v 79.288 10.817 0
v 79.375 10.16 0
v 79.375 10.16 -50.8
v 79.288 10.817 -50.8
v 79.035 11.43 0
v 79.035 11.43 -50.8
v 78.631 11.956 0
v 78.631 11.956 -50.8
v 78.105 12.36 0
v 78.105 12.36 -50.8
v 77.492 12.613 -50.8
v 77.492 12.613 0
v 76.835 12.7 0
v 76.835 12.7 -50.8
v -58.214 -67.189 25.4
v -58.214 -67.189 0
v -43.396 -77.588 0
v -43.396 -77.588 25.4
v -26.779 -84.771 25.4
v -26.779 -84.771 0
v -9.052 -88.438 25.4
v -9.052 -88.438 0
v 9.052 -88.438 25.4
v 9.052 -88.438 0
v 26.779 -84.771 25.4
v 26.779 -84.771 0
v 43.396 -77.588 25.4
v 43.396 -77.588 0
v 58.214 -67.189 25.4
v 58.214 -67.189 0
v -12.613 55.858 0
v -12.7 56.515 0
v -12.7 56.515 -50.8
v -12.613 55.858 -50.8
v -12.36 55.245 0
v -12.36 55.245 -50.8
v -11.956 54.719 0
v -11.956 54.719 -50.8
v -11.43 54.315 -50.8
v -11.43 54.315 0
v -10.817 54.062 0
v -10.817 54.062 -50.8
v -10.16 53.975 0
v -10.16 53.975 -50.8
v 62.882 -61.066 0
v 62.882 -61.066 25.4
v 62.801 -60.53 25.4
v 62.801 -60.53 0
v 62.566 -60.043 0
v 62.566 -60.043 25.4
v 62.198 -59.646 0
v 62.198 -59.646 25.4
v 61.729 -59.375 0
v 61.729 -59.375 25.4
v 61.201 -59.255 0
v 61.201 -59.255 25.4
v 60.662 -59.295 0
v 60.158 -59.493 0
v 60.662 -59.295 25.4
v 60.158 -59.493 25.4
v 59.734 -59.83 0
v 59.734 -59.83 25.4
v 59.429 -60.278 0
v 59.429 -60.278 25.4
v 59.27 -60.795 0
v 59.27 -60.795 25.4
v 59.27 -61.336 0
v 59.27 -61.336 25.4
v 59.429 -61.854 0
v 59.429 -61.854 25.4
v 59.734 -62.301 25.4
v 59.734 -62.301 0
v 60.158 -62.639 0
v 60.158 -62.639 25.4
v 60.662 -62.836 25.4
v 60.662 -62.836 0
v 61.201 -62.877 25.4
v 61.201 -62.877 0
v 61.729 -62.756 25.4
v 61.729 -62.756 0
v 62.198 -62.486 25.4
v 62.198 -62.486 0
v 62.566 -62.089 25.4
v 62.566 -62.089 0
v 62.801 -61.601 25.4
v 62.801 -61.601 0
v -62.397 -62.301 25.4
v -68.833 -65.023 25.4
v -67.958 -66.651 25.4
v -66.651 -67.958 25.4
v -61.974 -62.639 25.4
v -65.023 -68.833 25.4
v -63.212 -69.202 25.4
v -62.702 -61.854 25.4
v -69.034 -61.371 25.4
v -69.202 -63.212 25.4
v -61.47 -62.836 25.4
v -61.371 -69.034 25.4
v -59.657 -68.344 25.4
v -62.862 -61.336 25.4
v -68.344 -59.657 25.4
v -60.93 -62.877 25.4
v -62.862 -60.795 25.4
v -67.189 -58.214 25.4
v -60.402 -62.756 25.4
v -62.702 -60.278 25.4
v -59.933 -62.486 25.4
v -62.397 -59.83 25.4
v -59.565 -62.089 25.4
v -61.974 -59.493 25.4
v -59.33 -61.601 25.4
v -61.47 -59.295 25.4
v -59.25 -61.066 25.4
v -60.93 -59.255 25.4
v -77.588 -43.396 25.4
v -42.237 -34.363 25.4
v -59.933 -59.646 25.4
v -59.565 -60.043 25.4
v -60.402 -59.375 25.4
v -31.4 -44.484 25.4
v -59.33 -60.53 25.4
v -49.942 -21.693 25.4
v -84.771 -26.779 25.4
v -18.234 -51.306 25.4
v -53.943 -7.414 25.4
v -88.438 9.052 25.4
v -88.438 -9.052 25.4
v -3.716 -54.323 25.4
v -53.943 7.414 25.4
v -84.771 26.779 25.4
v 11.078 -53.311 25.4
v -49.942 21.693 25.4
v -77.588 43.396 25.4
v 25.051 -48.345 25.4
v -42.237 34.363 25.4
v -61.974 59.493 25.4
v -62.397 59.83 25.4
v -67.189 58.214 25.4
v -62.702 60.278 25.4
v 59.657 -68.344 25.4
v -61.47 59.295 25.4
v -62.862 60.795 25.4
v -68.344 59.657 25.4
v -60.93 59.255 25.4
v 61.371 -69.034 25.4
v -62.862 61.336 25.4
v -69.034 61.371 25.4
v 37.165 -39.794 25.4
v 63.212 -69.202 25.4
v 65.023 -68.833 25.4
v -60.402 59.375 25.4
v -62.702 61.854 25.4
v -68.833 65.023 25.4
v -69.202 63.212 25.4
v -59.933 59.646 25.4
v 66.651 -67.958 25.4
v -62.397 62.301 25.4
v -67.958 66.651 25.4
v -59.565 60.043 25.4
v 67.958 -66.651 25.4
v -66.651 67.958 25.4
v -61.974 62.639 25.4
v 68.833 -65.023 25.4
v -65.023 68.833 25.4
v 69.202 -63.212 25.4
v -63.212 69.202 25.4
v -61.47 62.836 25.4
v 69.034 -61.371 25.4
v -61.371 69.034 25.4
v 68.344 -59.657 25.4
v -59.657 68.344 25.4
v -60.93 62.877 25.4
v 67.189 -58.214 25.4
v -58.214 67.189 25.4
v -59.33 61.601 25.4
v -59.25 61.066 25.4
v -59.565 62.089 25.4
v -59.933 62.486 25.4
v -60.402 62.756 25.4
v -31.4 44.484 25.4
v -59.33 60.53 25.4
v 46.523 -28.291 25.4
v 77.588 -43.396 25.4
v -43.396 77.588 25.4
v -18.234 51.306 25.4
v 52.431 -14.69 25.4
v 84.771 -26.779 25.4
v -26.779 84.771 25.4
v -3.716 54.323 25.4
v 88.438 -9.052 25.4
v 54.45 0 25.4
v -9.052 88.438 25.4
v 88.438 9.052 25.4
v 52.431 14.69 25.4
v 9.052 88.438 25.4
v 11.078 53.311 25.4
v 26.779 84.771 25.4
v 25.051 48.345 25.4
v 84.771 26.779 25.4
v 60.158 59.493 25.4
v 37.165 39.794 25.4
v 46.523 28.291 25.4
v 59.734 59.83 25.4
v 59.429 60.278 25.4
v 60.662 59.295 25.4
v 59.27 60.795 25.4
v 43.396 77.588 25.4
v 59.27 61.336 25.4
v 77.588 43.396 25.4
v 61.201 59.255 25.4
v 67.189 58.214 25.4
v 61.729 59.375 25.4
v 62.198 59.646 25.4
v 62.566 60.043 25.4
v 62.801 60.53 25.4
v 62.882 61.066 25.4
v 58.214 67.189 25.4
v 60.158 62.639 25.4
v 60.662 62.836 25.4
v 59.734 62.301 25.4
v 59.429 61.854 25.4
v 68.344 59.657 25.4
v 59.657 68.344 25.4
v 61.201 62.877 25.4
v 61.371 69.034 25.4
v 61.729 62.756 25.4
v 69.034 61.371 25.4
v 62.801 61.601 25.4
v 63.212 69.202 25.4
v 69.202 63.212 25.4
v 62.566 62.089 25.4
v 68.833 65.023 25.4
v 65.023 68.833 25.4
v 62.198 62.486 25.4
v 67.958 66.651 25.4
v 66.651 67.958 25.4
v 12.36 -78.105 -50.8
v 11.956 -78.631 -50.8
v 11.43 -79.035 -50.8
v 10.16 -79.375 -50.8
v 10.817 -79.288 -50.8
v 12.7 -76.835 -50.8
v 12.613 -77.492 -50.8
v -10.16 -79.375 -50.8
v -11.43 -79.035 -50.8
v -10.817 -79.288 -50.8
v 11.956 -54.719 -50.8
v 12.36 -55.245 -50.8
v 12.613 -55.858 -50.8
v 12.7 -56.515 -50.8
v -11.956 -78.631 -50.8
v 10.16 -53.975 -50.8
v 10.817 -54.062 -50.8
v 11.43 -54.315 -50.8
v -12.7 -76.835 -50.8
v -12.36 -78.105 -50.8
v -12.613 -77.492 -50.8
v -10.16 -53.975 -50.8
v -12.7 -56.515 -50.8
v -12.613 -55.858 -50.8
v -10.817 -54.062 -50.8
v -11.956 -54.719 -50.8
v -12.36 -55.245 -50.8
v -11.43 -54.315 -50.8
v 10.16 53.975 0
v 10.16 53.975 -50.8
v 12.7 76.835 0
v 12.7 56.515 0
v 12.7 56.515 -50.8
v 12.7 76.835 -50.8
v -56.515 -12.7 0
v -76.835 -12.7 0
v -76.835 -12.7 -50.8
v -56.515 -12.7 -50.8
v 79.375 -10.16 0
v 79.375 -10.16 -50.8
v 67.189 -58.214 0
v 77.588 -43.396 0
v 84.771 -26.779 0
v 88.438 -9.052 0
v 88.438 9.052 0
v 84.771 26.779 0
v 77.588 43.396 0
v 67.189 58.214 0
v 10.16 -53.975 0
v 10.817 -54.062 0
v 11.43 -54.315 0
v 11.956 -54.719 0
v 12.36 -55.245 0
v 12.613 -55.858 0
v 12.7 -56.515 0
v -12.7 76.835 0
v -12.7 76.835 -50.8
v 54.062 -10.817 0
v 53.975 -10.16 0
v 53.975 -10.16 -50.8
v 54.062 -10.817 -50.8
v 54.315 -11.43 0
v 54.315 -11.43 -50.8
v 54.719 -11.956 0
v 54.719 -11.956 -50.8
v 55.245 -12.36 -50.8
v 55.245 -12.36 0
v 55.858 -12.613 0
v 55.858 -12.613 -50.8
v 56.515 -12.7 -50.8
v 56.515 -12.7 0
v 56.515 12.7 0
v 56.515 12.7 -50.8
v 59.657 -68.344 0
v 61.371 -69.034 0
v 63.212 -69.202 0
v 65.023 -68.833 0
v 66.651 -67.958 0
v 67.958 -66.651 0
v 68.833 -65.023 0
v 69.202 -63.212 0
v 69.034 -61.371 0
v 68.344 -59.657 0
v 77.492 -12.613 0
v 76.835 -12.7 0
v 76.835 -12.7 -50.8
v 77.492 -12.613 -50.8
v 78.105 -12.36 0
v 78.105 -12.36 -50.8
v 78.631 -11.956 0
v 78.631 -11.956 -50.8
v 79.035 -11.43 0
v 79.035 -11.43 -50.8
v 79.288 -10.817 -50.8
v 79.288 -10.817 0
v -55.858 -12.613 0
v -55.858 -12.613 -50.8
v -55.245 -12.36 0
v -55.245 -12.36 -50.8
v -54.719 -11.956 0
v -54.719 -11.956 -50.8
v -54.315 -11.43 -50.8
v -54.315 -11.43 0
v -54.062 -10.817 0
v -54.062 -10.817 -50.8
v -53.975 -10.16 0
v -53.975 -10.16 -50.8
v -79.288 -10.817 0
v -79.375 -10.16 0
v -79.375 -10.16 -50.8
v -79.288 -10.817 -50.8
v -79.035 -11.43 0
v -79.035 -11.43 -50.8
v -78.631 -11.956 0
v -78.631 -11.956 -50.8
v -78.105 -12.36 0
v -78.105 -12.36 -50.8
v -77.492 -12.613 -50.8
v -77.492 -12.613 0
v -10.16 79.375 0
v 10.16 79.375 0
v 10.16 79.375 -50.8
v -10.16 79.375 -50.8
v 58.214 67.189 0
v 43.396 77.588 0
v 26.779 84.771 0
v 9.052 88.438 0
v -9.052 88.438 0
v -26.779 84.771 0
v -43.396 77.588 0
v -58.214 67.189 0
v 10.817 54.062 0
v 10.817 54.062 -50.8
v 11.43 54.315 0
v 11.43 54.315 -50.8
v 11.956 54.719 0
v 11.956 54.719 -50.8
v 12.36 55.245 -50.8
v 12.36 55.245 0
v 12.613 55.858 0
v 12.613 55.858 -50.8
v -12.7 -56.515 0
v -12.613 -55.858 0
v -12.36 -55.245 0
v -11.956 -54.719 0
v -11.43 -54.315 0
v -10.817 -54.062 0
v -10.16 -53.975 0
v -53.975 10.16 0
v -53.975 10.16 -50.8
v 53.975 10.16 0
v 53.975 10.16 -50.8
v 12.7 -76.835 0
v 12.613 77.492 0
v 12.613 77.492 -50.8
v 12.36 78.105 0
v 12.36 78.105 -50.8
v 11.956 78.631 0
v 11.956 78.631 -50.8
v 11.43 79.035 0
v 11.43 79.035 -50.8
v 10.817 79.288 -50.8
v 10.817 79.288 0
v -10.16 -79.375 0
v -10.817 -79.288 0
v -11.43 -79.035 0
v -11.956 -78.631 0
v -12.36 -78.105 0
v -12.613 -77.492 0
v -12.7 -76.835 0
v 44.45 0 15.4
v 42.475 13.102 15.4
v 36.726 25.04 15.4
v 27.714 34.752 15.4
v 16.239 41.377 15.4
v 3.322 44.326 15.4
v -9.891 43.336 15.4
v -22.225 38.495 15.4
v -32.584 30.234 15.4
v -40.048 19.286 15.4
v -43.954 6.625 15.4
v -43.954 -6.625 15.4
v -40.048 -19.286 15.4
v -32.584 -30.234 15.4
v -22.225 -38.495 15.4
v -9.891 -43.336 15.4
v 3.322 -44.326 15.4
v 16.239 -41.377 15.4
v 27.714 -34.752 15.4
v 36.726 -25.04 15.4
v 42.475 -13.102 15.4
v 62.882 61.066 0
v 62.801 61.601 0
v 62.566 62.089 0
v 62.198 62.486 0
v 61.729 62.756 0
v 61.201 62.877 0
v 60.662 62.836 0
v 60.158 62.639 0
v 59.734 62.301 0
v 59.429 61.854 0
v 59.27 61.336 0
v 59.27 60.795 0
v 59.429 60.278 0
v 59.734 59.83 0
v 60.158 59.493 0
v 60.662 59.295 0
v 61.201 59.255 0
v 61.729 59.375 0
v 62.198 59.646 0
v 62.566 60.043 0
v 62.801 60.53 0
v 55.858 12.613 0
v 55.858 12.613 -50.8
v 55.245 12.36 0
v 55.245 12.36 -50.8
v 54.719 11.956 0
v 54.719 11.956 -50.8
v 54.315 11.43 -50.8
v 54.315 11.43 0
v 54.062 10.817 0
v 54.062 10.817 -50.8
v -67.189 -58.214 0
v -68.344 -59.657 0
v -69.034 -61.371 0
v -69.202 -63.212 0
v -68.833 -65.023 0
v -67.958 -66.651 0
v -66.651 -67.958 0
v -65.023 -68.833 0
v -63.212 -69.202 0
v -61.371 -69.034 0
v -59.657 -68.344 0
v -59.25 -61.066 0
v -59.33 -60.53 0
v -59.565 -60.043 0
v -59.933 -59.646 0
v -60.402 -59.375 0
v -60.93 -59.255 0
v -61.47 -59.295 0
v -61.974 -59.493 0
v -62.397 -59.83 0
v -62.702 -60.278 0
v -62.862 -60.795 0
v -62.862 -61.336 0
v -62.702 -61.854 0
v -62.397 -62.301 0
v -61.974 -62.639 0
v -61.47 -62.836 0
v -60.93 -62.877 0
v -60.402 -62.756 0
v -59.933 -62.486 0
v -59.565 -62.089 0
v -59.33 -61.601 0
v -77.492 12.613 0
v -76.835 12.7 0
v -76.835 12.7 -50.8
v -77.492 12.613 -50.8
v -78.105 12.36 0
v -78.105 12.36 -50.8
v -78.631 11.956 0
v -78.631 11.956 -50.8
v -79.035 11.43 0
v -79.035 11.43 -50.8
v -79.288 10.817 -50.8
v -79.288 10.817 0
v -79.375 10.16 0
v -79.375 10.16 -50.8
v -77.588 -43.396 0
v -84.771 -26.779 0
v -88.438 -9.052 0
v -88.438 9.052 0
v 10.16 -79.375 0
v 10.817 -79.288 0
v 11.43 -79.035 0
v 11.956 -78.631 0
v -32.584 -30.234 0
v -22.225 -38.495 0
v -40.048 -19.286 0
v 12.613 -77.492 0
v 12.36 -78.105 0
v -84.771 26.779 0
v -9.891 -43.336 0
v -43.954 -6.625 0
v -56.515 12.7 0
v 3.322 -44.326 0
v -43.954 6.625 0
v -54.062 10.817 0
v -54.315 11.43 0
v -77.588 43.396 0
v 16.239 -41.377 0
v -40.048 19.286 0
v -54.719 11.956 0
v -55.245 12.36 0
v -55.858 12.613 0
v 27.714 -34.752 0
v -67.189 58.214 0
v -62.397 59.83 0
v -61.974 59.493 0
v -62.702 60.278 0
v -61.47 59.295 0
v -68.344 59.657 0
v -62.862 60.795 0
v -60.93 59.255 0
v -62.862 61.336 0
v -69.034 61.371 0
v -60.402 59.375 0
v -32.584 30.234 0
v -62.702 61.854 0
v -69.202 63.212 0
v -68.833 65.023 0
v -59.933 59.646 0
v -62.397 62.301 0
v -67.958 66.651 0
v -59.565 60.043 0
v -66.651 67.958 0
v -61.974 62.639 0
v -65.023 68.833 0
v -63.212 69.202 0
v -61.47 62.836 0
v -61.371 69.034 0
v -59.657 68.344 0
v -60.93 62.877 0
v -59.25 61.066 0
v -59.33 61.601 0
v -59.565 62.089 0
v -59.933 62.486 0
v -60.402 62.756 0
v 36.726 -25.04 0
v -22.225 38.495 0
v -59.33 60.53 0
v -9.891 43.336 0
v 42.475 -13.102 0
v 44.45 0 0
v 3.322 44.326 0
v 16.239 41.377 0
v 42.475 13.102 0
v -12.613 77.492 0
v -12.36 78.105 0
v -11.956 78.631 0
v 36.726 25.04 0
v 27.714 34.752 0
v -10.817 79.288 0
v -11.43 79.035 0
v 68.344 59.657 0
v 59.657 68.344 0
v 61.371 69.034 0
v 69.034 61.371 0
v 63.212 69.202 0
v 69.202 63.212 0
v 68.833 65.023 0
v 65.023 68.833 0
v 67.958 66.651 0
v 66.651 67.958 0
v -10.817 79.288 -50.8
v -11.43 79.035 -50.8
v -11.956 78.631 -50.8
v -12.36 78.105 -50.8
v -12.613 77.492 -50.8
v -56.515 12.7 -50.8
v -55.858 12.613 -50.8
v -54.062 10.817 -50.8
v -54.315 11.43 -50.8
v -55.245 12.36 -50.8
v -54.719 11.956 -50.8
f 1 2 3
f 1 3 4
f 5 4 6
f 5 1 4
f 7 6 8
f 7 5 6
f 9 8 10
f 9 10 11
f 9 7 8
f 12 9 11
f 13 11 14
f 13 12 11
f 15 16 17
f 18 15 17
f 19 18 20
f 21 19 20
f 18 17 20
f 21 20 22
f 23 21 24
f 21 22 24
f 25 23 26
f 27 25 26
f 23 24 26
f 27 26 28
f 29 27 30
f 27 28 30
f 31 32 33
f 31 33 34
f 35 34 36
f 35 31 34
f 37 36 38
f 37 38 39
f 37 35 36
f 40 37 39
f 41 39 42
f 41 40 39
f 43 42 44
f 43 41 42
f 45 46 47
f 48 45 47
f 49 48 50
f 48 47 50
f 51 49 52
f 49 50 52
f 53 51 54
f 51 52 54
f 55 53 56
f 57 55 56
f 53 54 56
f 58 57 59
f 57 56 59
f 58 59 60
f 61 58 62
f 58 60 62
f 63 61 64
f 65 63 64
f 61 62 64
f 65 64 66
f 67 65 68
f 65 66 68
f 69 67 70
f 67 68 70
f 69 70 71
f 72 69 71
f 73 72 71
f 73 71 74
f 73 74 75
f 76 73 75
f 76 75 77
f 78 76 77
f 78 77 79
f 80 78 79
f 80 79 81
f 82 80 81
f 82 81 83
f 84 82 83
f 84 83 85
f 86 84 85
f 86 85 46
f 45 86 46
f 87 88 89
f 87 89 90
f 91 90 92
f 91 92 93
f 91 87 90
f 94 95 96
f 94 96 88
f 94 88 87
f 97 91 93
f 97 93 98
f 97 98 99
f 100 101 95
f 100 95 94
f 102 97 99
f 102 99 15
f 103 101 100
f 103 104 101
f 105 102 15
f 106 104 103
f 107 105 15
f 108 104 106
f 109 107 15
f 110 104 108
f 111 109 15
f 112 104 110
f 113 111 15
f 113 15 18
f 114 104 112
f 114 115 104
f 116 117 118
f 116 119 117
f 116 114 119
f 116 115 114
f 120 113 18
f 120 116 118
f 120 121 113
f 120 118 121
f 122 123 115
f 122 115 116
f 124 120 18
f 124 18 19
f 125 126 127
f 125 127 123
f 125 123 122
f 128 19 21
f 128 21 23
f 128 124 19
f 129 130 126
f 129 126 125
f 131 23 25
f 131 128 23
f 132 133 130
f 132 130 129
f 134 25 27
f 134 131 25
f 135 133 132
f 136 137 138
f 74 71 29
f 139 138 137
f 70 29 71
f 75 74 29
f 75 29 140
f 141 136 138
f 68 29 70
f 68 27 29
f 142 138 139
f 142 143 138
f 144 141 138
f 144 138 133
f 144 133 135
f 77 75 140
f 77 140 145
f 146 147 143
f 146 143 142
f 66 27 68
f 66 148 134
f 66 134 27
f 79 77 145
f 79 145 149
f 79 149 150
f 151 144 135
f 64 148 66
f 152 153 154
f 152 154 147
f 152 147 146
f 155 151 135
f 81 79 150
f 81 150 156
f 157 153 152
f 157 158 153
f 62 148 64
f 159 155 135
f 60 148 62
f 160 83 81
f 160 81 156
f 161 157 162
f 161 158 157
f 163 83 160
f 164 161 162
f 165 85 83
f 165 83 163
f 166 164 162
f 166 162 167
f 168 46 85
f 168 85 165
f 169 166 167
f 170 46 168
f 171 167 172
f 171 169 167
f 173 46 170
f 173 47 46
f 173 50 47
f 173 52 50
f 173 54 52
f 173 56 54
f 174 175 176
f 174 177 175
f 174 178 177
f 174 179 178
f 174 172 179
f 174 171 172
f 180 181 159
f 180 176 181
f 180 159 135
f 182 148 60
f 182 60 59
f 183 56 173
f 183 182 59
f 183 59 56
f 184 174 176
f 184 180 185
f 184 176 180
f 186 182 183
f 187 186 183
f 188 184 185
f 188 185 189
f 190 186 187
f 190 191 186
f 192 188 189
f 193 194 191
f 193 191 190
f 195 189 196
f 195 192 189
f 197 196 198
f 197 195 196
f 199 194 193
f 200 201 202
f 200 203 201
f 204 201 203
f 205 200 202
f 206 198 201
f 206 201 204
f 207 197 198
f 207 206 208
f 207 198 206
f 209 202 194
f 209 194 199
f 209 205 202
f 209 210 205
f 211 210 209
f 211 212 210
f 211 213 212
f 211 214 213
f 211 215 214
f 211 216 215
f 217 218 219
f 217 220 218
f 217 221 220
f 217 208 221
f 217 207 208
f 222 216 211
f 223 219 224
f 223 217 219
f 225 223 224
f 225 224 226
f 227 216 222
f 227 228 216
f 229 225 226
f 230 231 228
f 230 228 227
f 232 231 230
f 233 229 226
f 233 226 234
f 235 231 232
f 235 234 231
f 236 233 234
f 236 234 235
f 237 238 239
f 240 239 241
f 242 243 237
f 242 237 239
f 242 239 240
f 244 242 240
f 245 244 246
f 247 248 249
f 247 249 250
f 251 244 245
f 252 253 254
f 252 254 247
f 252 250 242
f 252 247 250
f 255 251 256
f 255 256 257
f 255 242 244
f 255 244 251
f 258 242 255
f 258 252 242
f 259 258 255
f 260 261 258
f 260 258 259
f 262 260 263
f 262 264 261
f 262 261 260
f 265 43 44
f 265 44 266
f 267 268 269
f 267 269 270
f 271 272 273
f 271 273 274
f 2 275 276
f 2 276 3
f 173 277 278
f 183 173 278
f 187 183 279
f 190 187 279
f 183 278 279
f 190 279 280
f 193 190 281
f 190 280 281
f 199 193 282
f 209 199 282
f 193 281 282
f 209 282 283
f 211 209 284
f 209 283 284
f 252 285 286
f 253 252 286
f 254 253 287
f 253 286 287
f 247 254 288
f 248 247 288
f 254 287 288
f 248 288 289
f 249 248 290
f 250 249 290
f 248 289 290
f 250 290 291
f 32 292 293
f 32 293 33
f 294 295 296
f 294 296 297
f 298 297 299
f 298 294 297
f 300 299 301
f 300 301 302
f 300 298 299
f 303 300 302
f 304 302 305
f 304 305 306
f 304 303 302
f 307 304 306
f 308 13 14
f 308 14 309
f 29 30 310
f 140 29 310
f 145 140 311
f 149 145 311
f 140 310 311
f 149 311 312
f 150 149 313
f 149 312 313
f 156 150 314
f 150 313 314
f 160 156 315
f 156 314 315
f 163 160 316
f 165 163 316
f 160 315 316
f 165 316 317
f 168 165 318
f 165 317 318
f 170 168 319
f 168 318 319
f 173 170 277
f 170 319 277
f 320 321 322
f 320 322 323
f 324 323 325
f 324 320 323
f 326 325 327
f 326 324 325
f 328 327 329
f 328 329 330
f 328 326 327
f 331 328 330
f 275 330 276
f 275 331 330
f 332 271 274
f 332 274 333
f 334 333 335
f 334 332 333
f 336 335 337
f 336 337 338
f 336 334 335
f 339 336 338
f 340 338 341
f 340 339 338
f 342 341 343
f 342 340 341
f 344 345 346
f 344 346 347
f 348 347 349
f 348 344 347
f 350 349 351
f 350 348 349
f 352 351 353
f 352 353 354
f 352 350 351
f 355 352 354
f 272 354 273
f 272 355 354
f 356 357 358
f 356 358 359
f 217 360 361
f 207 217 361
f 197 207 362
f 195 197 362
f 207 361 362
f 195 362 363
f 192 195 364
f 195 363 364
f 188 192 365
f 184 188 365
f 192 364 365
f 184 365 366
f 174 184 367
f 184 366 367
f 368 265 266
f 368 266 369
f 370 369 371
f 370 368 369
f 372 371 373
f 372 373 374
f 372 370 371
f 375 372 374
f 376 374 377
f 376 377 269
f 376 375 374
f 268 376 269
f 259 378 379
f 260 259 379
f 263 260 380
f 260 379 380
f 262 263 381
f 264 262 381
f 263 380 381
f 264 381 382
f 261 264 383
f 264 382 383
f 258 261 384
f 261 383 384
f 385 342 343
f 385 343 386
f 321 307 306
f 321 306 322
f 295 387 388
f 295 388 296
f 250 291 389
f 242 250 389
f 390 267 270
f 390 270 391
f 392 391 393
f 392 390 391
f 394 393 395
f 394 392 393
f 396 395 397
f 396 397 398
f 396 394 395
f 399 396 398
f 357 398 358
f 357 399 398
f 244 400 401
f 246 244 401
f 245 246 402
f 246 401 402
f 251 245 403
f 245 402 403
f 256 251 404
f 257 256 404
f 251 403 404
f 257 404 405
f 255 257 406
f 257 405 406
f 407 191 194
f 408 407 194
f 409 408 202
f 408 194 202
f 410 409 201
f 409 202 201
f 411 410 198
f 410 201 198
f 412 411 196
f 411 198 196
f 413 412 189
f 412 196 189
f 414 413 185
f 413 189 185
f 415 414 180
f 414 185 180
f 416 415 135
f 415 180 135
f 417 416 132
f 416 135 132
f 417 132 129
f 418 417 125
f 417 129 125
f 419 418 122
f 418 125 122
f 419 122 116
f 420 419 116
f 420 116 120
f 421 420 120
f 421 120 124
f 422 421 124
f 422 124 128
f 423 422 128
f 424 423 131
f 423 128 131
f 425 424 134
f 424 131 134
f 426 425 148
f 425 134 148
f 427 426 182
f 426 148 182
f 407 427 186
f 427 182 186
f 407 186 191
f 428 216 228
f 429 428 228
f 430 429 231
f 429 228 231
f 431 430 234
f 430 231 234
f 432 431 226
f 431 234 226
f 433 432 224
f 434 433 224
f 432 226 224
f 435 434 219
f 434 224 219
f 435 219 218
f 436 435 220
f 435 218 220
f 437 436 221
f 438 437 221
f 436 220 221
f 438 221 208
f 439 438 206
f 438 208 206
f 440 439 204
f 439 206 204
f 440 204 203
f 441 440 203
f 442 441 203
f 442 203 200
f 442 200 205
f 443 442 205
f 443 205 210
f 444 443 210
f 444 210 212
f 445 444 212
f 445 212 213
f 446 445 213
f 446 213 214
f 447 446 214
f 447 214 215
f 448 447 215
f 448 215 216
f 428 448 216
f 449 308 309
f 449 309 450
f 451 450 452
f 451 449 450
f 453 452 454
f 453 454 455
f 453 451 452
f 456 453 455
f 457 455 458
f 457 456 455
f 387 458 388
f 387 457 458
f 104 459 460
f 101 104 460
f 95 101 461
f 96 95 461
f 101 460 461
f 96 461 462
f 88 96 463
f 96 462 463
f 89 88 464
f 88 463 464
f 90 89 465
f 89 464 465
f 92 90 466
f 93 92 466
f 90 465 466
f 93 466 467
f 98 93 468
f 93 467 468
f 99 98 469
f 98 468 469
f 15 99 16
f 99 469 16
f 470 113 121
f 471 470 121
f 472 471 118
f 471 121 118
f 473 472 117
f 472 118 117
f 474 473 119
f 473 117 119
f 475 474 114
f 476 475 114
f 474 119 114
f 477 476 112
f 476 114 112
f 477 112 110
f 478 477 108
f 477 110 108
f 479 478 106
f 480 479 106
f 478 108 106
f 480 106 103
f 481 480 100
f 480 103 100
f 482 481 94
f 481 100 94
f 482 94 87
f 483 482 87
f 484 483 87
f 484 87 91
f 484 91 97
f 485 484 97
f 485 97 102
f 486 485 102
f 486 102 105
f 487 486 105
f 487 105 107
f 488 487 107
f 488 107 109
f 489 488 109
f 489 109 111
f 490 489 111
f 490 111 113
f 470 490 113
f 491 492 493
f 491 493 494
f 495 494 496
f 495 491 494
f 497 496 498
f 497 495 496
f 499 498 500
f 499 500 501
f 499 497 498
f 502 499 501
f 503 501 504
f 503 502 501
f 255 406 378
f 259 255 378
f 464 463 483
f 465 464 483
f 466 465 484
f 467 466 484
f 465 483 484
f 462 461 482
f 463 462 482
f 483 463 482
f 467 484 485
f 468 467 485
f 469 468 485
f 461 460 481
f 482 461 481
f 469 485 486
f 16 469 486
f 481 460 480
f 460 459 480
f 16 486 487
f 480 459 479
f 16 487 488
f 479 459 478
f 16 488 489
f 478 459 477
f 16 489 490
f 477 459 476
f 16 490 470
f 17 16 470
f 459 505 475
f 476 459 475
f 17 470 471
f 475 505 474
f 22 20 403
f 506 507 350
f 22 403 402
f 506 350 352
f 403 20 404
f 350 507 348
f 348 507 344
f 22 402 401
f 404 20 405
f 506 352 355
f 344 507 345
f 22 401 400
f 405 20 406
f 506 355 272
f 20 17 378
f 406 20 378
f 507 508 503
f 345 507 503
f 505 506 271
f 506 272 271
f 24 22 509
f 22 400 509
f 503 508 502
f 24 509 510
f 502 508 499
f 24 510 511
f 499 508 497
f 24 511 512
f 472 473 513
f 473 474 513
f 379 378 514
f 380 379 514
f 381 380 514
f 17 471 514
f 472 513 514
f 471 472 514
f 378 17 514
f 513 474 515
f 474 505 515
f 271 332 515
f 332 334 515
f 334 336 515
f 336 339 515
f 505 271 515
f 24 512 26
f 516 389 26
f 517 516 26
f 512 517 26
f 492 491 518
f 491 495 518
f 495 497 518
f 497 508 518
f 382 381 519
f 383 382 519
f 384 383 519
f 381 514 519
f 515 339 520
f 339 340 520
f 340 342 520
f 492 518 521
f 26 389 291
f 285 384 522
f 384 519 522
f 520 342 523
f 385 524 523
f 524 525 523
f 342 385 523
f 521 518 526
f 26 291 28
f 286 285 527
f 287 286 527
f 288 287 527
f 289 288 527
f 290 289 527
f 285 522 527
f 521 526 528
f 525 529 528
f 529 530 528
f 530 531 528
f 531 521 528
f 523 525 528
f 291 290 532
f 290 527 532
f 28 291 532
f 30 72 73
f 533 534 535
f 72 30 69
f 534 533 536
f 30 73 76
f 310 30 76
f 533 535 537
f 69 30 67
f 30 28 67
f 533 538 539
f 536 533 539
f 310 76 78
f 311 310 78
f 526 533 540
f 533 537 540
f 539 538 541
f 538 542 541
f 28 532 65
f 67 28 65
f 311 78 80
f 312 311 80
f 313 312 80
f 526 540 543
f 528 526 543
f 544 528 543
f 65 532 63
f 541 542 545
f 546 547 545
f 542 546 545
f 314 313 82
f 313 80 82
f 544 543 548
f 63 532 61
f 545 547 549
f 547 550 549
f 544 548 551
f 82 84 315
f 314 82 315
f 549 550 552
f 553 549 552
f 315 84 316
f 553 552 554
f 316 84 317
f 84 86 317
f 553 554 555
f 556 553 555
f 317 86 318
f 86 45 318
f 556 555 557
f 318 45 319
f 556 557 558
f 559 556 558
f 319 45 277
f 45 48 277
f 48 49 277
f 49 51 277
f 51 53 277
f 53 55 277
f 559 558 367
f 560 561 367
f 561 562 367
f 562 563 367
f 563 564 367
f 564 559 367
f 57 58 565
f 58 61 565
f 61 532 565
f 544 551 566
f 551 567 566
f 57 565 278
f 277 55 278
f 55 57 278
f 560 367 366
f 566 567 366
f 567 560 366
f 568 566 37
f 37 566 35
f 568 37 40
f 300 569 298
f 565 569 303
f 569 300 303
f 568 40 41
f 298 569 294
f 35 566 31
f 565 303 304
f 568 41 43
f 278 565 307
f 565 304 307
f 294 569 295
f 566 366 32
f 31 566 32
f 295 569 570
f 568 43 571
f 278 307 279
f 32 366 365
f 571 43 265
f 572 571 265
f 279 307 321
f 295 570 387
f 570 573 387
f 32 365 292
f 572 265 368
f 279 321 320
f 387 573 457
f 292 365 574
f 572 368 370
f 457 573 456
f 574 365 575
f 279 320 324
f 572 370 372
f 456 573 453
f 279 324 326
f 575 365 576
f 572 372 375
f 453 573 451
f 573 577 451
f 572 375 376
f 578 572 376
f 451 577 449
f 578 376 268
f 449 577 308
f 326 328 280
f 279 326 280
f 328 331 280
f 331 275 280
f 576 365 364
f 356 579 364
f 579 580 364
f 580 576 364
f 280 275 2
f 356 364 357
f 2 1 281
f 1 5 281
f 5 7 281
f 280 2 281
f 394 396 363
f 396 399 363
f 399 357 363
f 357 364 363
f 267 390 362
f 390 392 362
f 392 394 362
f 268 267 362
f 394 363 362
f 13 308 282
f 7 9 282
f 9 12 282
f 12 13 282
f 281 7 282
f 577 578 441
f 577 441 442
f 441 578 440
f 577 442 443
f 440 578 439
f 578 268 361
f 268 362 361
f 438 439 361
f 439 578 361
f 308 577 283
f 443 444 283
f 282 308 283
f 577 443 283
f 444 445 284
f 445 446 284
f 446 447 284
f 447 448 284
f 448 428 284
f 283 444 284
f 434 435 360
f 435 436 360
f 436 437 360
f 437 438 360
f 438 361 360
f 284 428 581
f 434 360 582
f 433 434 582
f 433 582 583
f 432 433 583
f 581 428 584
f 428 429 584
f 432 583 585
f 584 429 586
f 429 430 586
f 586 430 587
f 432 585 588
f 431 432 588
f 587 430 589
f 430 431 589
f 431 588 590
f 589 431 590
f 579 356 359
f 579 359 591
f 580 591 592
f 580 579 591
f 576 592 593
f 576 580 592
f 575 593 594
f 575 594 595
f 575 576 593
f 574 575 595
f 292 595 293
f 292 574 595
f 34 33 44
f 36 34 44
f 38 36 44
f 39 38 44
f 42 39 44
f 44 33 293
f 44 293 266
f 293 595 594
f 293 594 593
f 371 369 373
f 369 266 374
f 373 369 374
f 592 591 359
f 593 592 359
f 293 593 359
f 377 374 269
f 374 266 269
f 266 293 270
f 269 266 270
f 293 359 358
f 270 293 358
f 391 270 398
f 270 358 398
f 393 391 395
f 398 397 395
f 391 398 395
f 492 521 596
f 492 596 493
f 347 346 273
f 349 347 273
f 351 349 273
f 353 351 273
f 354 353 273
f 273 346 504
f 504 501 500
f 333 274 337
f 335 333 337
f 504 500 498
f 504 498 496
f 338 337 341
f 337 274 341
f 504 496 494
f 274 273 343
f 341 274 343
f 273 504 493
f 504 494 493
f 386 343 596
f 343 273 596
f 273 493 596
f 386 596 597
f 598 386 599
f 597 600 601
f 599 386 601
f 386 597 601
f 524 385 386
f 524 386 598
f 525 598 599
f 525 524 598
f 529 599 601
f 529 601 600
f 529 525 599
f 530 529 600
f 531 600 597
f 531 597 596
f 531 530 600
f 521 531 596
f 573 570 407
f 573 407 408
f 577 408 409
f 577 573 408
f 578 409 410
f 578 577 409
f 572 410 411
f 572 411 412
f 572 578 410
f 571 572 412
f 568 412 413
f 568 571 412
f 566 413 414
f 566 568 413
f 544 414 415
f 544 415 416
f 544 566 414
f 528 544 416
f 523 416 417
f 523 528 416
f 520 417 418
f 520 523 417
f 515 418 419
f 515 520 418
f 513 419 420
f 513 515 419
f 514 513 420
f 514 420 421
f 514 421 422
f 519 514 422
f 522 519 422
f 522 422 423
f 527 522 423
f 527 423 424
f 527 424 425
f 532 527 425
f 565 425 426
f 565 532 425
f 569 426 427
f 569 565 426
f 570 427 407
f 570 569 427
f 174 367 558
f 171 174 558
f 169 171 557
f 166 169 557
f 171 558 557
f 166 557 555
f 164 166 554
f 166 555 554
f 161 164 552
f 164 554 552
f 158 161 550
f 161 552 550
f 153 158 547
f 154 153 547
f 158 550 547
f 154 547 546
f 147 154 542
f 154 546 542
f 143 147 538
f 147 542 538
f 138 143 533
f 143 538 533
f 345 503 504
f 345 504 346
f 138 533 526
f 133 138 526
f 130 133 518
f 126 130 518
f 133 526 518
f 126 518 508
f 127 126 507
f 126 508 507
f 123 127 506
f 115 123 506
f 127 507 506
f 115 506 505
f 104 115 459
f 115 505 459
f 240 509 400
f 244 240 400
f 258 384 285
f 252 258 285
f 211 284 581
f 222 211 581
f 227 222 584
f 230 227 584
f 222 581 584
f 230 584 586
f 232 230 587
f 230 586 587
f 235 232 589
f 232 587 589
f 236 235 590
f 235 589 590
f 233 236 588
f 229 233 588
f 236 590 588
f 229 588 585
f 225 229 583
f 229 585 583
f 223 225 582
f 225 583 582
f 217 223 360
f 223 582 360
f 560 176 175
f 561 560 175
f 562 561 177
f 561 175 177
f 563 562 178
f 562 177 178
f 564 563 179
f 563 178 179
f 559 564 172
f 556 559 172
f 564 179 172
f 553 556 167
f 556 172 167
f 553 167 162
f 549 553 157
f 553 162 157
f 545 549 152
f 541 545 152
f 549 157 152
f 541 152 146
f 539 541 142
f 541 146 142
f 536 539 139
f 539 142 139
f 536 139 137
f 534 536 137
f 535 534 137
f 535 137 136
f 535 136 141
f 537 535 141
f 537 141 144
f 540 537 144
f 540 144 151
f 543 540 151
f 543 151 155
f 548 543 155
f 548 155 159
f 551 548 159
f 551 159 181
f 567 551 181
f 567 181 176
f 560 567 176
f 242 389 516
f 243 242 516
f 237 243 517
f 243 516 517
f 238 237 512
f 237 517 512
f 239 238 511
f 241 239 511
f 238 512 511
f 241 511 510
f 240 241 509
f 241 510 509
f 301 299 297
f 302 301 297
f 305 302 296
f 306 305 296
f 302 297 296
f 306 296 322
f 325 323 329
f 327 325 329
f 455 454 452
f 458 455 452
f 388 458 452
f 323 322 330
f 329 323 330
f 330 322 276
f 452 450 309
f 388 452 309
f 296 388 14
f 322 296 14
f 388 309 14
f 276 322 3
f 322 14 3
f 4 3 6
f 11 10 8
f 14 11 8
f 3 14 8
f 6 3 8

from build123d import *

# Parameters (mm, degrees)
SKETCH1_R           = 44.45
BOSS_EXTRUDE1_DEPTH = 25.4
CHAMFER1_SIZE       = 10
SKETCH3_R           = 1.8161
CUT_EXTRUDE1_DEPTH  = 26.4
BOSS_EXTRUDE3_DEPTH = 50.8


with BuildPart() as part:
    # Sketch1 → Boss-Extrude1 (new body)
    with BuildSketch(Plane.XY):
        with BuildLine():
            ThreePointArc((67.188694676, -58.214167586), (88.9, 0), (67.188694676, 58.214167586))
            ThreePointArc((67.188694676, 58.214167586), (67.351920908, 67.351920908), (58.214167586, 67.188694676))
            ThreePointArc((58.214167586, 67.188694676), (0, 88.9), (-58.214167586, 67.188694676))
            ThreePointArc((-58.214167586, 67.188694676), (-67.351920908, 67.351920908), (-67.188694676, 58.214167586))
            ThreePointArc((-67.188694676, 58.214167586), (-88.9, 0), (-67.188694676, -58.214167586))
            ThreePointArc((-67.188694676, -58.214167586), (-67.351920908, -67.351920908), (-58.214167586, -67.188694676))
            ThreePointArc((-58.214167586, -67.188694676), (0, -88.9), (58.214167586, -67.188694676))
            ThreePointArc((58.214167586, -67.188694676), (67.351920908, -67.351920908), (67.188694676, -58.214167586))
        make_face()
        Circle(SKETCH1_R, mode=Mode.SUBTRACT)
    extrude(amount=BOSS_EXTRUDE1_DEPTH)

    # Chamfer1
    chamfer1_edges = [part.edges().sort_by_distance(p)[0] for p in [
        (-44.45, 0, 25.4),
    ]]
    chamfer(chamfer1_edges, length=CHAMFER1_SIZE)

    # Sketch3 → Cut-Extrude1 (cut, through all)
    with BuildSketch(Plane.XY.offset(25.4)):
        with Locations((61.065741623, 61.065741623)):
            Circle(SKETCH3_R)
        with Locations((61.065741623, -61.065741623)):
            Circle(SKETCH3_R)
        with Locations((-61.065741623, -61.065741623)):
            Circle(SKETCH3_R)
        with Locations((-61.065741623, 61.065741623)):
            Circle(SKETCH3_R)
    extrude(amount=-CUT_EXTRUDE1_DEPTH, mode=Mode.SUBTRACT)

    # Sketch5 → Boss-Extrude3 (add)
    with BuildSketch(Plane(origin=(0, 0, 0), x_dir=(-1, 0, 0), z_dir=(0, 0, -1))):
        with BuildLine():
            Line((-76.835, 12.7), (-56.515, 12.7))
            ThreePointArc((-56.515, 12.7), (-54.718948776, 11.956051224), (-53.975, 10.16))
            Line((-53.975, 10.16), (-53.975, -10.16))
            ThreePointArc((-53.975, -10.16), (-54.718948776, -11.956051224), (-56.515, -12.7))
            Line((-56.515, -12.7), (-76.835, -12.7))
            ThreePointArc((-76.835, -12.7), (-78.631051224, -11.956051224), (-79.375, -10.16))
            Line((-79.375, -10.16), (-79.375, 10.16))
            ThreePointArc((-79.375, 10.16), (-78.631051224, 11.956051224), (-76.835, 12.7))
        make_face()
        with BuildLine():
            Line((-10.16, -79.375), (10.16, -79.375))
            ThreePointArc((10.16, -79.375), (11.956051224, -78.631051224), (12.7, -76.835))
            Line((12.7, -76.835), (12.7, -56.515))
            ThreePointArc((12.7, -56.515), (11.956051224, -54.718948776), (10.16, -53.975))
            Line((10.16, -53.975), (-10.16, -53.975))
            ThreePointArc((-10.16, -53.975), (-11.956051224, -54.718948776), (-12.7, -56.515))
            Line((-12.7, -56.515), (-12.7, -76.835))
            ThreePointArc((-12.7, -76.835), (-11.956051224, -78.631051224), (-10.16, -79.375))
        make_face()
        with BuildLine():
            Line((12.7, 76.835), (12.7, 56.515))
            ThreePointArc((12.7, 56.515), (11.956051224, 54.718948776), (10.16, 53.975))
            Line((10.16, 53.975), (-10.16, 53.975))
            ThreePointArc((-10.16, 53.975), (-11.956051224, 54.718948776), (-12.7, 56.515))
            Line((-12.7, 56.515), (-12.7, 76.835))
            ThreePointArc((-12.7, 76.835), (-11.956051224, 78.631051224), (-10.16, 79.375))
            Line((-10.16, 79.375), (10.16, 79.375))
            ThreePointArc((10.16, 79.375), (11.956051224, 78.631051224), (12.7, 76.835))
        make_face()
        with BuildLine():
            Line((76.835, -12.7), (56.515, -12.7))
            ThreePointArc((56.515, -12.7), (54.718948776, -11.956051224), (53.975, -10.16))
            Line((53.975, -10.16), (53.975, 10.16))
            ThreePointArc((53.975, 10.16), (54.718948776, 11.956051224), (56.515, 12.7))
            Line((56.515, 12.7), (76.835, 12.7))
            ThreePointArc((76.835, 12.7), (78.631051224, 11.956051224), (79.375, 10.16))
            Line((79.375, 10.16), (79.375, -10.16))
            ThreePointArc((79.375, -10.16), (78.631051224, -11.956051224), (76.835, -12.7))
        make_face()
    extrude(amount=BOSS_EXTRUDE3_DEPTH)


solid = part.part
